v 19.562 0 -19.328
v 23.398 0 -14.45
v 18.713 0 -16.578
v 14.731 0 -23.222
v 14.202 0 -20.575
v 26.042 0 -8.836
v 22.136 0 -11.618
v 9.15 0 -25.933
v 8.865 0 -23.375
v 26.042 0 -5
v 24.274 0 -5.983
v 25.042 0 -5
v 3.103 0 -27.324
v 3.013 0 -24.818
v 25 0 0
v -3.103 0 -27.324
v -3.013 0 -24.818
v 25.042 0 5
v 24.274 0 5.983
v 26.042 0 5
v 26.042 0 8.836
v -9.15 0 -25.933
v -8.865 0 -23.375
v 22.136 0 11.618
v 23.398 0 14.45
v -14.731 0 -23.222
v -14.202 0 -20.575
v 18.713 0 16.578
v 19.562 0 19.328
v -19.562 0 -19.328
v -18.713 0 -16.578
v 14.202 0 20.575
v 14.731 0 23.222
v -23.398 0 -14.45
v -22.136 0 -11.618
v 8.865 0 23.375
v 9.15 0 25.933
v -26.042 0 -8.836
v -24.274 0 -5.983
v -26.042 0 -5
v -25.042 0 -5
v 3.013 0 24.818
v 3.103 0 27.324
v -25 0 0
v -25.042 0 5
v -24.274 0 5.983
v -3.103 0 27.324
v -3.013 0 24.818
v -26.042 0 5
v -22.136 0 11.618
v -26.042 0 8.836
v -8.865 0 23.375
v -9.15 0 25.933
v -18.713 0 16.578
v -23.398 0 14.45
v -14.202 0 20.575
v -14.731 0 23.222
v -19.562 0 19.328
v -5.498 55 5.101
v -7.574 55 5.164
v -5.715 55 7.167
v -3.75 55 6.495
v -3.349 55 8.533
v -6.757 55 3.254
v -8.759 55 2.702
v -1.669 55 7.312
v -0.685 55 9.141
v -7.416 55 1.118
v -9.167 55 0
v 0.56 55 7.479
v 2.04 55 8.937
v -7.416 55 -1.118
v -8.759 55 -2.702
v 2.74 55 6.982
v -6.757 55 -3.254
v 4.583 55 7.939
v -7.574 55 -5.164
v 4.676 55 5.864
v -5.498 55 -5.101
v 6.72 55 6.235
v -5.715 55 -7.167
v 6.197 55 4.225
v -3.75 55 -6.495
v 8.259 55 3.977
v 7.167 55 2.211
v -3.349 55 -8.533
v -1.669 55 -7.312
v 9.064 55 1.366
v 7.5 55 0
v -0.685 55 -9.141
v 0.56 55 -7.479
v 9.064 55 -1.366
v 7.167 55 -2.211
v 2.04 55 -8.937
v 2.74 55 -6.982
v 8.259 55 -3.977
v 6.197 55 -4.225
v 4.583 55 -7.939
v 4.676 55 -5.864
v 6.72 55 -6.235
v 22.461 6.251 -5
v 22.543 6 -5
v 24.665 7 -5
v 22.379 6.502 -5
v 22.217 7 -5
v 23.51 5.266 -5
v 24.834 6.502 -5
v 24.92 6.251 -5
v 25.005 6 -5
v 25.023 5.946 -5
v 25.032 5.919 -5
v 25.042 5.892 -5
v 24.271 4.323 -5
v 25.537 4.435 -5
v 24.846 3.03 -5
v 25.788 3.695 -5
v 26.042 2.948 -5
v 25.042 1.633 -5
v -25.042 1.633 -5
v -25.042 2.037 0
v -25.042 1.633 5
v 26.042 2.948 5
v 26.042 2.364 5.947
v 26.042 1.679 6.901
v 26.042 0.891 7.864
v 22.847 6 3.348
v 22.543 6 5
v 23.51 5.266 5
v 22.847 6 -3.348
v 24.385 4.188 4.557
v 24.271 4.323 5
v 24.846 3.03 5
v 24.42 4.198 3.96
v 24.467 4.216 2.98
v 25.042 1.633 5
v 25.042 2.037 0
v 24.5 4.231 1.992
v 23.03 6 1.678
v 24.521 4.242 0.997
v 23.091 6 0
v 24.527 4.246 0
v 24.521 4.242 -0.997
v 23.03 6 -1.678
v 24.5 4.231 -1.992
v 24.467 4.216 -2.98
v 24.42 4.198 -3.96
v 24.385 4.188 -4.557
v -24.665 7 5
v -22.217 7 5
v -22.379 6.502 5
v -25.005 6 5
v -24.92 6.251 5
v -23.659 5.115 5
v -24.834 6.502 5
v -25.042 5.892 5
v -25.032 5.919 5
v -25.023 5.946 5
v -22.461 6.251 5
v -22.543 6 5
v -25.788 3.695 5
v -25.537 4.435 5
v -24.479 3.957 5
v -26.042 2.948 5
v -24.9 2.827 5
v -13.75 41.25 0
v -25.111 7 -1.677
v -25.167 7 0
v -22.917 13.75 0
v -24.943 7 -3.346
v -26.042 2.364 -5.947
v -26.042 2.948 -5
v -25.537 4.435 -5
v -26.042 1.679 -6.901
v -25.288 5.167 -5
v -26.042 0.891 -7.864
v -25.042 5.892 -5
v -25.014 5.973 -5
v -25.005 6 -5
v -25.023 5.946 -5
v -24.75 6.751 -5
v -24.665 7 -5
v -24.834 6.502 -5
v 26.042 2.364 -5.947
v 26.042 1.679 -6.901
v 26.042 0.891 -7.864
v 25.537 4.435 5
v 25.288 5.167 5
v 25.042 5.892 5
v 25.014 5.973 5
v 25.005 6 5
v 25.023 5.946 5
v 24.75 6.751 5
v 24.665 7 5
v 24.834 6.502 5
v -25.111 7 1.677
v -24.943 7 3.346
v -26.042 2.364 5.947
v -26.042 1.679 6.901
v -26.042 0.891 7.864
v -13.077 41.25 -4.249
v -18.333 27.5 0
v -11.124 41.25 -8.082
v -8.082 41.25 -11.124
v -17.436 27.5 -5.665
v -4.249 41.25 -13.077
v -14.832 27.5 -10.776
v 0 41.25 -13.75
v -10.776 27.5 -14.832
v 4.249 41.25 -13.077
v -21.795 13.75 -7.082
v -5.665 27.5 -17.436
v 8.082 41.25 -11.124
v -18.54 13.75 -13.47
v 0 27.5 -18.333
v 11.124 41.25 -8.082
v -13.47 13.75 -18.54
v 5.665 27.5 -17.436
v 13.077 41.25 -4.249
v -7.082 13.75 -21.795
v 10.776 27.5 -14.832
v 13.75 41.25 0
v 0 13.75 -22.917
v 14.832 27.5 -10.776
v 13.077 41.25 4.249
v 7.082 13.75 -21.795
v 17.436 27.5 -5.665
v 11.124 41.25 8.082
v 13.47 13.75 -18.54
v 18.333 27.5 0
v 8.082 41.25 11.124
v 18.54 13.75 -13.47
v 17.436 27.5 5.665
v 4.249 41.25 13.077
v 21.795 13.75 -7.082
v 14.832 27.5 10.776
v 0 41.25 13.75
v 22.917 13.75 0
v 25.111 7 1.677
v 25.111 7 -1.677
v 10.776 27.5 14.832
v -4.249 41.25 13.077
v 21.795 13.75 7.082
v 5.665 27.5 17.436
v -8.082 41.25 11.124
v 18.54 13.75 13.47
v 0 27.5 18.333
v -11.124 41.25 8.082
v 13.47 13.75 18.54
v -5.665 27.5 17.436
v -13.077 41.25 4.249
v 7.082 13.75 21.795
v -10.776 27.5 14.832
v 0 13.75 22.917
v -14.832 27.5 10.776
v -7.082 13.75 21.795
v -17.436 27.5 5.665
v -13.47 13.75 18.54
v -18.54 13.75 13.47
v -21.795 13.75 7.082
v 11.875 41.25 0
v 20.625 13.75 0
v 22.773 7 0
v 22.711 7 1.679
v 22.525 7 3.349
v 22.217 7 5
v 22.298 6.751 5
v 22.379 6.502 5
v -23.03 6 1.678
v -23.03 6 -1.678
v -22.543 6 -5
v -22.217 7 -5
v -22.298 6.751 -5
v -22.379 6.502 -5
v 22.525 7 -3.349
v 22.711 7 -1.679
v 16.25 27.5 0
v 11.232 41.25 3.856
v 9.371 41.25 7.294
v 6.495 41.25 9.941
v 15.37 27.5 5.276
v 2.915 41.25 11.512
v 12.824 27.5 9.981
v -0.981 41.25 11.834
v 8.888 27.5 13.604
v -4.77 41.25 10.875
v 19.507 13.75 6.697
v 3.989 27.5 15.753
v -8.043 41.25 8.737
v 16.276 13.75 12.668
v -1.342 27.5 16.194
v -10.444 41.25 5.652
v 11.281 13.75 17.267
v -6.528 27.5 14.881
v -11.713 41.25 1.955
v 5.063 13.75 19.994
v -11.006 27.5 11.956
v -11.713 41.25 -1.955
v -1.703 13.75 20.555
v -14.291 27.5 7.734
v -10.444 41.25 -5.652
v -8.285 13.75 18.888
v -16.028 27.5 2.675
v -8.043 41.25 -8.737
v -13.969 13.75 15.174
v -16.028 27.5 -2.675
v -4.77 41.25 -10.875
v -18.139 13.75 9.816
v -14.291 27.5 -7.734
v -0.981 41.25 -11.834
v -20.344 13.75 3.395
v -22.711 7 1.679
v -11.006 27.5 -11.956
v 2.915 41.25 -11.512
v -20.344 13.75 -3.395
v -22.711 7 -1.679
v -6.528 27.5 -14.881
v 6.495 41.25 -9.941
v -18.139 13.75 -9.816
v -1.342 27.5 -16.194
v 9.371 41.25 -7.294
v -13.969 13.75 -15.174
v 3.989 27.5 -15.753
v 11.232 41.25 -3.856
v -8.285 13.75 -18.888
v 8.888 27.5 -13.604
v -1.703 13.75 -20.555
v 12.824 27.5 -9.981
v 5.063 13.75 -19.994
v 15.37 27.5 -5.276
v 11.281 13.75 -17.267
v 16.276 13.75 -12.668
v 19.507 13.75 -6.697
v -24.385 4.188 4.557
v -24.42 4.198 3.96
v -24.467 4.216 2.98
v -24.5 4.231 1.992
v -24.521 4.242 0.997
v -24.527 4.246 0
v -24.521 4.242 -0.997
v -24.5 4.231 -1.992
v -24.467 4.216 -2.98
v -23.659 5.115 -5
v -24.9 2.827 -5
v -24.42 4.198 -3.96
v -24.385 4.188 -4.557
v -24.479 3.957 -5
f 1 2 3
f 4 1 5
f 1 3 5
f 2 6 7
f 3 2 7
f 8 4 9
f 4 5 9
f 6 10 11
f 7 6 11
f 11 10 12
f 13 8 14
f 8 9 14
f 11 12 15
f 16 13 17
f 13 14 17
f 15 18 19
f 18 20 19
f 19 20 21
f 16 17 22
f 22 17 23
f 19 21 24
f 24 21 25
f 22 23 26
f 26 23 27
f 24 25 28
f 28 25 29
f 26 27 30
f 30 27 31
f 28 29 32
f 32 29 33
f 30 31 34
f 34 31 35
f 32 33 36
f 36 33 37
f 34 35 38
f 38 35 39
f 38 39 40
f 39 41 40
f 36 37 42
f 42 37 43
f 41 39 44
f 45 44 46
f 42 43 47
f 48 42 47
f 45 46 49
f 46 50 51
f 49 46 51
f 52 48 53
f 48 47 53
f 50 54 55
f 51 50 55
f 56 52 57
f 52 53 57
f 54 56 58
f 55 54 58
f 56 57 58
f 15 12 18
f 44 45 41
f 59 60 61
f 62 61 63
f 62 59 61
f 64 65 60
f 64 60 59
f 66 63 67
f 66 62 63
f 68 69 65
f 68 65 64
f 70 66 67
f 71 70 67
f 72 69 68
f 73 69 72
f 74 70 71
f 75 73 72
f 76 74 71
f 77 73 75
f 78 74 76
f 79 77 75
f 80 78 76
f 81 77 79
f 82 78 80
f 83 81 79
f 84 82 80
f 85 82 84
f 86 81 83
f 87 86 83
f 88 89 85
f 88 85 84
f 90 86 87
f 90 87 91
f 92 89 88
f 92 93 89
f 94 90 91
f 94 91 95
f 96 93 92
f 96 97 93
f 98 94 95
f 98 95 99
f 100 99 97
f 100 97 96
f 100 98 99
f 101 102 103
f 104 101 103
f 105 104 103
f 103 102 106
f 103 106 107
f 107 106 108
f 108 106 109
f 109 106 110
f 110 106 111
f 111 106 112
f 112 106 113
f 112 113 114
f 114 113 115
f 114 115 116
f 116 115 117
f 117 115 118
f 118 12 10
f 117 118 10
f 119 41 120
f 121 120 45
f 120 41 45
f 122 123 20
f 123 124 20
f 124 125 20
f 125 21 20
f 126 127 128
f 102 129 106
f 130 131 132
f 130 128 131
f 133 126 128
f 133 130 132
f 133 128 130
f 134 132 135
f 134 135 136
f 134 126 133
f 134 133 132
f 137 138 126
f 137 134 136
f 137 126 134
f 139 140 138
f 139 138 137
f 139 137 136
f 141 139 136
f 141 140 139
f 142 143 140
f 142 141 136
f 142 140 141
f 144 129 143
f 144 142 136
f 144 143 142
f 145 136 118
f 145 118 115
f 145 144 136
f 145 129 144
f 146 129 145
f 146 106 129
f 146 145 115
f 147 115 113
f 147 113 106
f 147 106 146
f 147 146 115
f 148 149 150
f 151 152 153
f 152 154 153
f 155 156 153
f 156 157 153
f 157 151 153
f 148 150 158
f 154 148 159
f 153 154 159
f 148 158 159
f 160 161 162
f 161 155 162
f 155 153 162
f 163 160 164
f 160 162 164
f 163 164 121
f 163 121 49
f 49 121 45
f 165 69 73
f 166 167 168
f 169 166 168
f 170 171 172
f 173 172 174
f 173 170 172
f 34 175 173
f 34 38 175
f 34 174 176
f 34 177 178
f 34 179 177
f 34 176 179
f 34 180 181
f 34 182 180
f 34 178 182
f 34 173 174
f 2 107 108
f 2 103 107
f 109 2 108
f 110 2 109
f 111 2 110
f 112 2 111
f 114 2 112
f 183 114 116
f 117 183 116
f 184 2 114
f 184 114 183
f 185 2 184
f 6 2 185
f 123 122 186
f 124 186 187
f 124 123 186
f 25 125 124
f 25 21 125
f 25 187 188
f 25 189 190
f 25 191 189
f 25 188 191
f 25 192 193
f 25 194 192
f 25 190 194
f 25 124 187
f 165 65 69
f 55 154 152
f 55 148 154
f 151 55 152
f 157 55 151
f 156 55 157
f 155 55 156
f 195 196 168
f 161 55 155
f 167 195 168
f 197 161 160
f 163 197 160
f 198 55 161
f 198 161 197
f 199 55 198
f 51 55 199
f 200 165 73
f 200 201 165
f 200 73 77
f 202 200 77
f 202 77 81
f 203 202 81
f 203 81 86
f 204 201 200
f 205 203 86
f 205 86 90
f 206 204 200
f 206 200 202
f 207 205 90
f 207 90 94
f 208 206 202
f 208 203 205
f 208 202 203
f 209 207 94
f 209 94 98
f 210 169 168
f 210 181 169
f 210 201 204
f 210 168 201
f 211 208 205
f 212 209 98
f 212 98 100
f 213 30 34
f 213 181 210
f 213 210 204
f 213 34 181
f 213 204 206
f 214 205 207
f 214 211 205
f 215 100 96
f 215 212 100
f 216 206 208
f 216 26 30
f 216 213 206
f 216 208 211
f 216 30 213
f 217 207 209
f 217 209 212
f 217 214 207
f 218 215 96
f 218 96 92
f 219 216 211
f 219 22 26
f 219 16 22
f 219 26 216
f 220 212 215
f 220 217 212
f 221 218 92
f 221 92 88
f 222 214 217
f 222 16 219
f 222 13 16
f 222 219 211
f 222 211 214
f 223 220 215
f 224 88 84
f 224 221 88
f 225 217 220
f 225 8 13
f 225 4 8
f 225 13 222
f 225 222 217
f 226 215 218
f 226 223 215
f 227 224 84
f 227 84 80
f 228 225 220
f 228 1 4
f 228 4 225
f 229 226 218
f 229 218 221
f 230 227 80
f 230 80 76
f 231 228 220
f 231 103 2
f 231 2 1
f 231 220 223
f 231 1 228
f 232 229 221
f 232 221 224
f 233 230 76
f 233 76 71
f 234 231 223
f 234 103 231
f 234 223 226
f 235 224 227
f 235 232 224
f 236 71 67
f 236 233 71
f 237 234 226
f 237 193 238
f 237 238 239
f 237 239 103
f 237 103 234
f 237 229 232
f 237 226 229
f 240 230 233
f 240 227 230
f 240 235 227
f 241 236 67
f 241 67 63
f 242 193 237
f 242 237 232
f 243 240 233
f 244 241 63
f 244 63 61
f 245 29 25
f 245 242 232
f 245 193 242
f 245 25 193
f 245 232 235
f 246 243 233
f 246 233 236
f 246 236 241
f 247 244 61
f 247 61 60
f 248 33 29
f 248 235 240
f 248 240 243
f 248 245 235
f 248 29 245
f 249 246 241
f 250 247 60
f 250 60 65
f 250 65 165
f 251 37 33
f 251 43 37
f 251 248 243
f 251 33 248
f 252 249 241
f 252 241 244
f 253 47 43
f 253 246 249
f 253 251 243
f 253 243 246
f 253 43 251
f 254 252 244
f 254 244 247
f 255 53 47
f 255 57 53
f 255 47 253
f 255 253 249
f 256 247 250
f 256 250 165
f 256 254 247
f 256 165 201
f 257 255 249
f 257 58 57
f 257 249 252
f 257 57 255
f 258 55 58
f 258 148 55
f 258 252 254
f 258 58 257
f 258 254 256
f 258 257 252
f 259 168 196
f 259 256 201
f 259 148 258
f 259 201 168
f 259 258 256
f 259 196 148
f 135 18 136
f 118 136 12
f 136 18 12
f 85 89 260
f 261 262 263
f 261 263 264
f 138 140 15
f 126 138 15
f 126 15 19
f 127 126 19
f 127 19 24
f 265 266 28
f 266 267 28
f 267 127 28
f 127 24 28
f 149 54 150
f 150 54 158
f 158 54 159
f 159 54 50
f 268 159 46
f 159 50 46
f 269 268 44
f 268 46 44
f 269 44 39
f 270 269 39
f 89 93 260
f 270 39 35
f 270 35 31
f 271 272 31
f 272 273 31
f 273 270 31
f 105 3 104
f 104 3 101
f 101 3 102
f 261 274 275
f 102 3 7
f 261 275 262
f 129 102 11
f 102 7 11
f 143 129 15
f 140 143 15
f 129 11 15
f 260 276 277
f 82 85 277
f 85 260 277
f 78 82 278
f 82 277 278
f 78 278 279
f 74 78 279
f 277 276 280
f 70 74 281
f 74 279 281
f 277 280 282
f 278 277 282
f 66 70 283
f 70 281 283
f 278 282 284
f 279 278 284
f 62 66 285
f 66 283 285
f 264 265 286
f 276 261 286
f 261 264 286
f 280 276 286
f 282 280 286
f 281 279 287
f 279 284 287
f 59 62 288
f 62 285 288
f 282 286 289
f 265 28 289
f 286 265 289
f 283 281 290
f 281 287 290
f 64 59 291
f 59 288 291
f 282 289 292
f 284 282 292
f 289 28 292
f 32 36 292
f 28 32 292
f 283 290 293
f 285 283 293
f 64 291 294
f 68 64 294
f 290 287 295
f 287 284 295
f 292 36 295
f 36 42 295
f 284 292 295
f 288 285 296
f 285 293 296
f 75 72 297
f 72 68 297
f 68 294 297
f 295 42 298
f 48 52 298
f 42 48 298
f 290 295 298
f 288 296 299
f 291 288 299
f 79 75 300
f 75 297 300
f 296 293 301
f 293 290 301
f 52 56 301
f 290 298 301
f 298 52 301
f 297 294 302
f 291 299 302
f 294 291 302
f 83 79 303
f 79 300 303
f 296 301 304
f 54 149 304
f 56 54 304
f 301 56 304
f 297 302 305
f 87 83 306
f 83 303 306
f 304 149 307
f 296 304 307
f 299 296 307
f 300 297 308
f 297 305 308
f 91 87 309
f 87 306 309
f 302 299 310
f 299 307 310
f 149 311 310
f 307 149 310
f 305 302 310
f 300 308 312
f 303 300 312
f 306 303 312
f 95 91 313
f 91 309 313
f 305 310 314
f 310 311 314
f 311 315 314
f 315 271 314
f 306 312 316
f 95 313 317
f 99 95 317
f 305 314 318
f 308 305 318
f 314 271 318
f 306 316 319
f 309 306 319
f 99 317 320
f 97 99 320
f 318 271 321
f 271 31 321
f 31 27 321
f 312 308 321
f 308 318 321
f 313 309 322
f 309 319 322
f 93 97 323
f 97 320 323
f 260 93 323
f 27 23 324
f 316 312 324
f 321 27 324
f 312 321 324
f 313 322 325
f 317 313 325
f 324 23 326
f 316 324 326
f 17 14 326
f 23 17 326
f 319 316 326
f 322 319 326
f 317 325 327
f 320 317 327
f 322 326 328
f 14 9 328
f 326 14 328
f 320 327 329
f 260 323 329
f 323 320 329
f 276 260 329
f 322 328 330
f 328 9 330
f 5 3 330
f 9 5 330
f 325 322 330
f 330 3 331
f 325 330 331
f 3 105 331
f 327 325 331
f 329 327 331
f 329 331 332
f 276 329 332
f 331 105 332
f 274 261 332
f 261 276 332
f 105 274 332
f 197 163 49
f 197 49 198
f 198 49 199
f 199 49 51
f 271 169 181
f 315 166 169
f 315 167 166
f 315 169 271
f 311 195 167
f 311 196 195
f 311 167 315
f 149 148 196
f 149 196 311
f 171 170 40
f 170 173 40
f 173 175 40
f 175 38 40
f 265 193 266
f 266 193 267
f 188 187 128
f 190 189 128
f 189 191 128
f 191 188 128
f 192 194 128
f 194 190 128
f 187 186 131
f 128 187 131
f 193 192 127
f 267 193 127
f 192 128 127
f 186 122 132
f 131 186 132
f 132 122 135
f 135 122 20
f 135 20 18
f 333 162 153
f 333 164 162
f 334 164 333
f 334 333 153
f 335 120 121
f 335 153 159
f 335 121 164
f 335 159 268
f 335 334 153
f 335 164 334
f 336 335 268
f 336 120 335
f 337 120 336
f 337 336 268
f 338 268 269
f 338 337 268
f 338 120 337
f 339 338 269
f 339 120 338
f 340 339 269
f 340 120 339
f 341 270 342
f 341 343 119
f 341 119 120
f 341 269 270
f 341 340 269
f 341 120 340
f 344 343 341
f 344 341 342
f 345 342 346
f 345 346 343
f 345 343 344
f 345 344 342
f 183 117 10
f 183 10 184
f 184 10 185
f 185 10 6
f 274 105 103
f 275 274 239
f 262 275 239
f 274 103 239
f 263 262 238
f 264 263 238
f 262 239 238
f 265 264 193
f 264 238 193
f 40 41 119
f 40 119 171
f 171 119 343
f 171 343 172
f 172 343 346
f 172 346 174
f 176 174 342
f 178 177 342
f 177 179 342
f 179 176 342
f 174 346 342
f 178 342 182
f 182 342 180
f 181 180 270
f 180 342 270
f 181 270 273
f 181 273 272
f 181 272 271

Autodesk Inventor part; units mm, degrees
ref_plane "YZ Plane" through (0, 0, 0) normal (1, 0, 0) x (0, 1, 0)
ref_plane "XZ Plane" through (0, 0, 0) normal (0, 1, 0) x (-1, 0, 0)
ref_plane "XY Plane" through (0, 0, 0) normal (0, 0, 1) x (1, 0, 0)
sketch "Sketch1" plane through (0, 0, 0) normal (0, 1, 0) x (-1, 0, 0)
  point P0 (0, 0)
sketch "Sketch2" plane through (0, 0, 0) normal (0, 1, 0) x (-1, 0, 0)
  circle A0 centre (0, 0) radius 7.5
  dimension "d0" = 15
extrude "Extrusion1" add sketch "Sketch2" along normal blind 60
sketch "Sketch3" plane through (0, 60, 0) normal (0, 1, 0) x (1, 0, 0)
  circle A0 centre (0, 0) radius 7.5
sketch "Sketch4" plane through (0, 0, 0) normal (0, -1, 0) x (1, 0, 0)
  circle A0 centre (0, 0) radius 25
  circle A1 centre (0, 0) radius 7.5 projected
  circle A2 centre (0, 0) radius 27.5
  dimension "d3" = 50
  dimension "d4" = 55
loft "Loft1" add profiles "Sketch4" section 1 edges at (7.5, 60, 0) contours A0 | A1 | A2
sketch "Sketch5" plane through (0, 0, 0) normal (0, -1, 0) x (1, 0, 0)
  circle A0 centre (0, 0) radius 7.5 projected
  circle A1 centre (0, 0) radius 27.5
  circle A2 centre (0, 0) radius 25
  circle A3 centre (0, 0) radius 7.5
  dimension "d9" = 50
  dimension "d10" = 15
sketch "Sketch6" plane through (0, 60, 0) normal (0, 1, 0) x (1, 0, 0)
  circle A0 centre (0, 0) radius 7.5
extrude "Extrusion2" cut sketch "Sketch6" against normal blind 5
sketch "Sketch7" plane through (0, 55, 0) normal (0, 1, 0) x (1, 0, 0)
  circle A0 centre (0, 0) radius 7.5
  line L0 (-11.197, -10.4421) -> (10.2744, -10.4421)
  line L1 (10.2744, -10.4421) -> (10.2744, 11.5325)
  line L2 (10.2744, 11.5325) -> (-11.197, 11.5325)
  line L3 (-11.197, 11.5325) -> (-11.197, -10.4421)
loft "Loft2" cut profiles "Sketch5" section 1 edges at (-7.5, 55, 0) contours A0 | A2
extrude "Extrusion3" cut sketch "Sketch7" along normal through all
sketch "Sketch8" plane through (0, 0, 0) normal (0, -1, 0) x (1, 0, 0)
  circle A0 centre (0, 0) radius 25
  circle A1 centre (0, 0) radius 27.5
  line L0 (27.5, 0) -> (27.5, -5)
  line L1 (27.0416, -5) -> (26.0416, -5)
  line L2 (26.0416, -5) -> (26.0416, 5)
  line L3 (26.0416, 5) -> (27.0416, 5)
  line L4 (27.0416, 5) -> (27.0416, -5)
  line L5 (-27.5, 0) -> (-27.5, -5)
  line L6 (-27.0416, -5) -> (-26.0416, -5)
  line L7 (-26.0416, -5) -> (-26.0416, 5)
  line L8 (-26.0416, 5) -> (-27.0416, 5)
  line L9 (-27.0416, 5) -> (-27.0416, -5)
  line L10 (26.0416, -5) -> (25.0416, -5)
  line L11 (25.0416, -5) -> (25.0416, 5)
  line L12 (25.0416, 5) -> (26.0416, 5)
  line L13 (26.0416, 5) -> (26.0416, -5)
  line L14 (-26.0416, -5) -> (-25.0416, -5)
  line L15 (-25.0416, -5) -> (-25.0416, 5)
  line L16 (-25.0416, 5) -> (-26.0416, 5)
  line L17 (-26.0416, 5) -> (-26.0416, -5)
  line L18 (-26.0416, 5) -> (-26.0416, 8.8365)
  line L19 (-26.0416, -5) -> (-26.0416, -8.8365)
  line L20 (26.0416, -5) -> (26.0416, -8.8365)
  line L21 (26.0416, 5) -> (26.0416, 8.8365)
  circle A2 centre (0, 0) radius 27.5 projected
  dimension "d19" = 5
  dimension "d20" = 1
  dimension "d21" = 10
  dimension "d22" = 5
  dimension "d23" = 1
  dimension "d24" = 10
  dimension "d25" = 1
  dimension "d26" = 1
extrude "Extrusion4" cut sketch "Sketch8" against normal through all contours A1 L4 | L3 L21 A1 | L4 L1 L2 L3 | A1 L20 L1 | L18 L8 A1 | A1 L6 L19 | L9 A1 | L8 L7 L6 L9
sketch "Sketch9" plane through (0, 0, 0) normal (0, -1, 0) x (1, 0, 0)
  circle A0 centre (0, 0) radius 27.5
  circle A1 centre (0, 0) radius 25
  line L0 (27.5, 0) -> (27.5, -5)
  line L1 (26.0416, -8.8365) -> (26.0416, 8.8365) projected
  line L2 (27.0416, -5) -> (26.0416, -5)
  line L3 (26.0416, -5) -> (26.0416, 5)
  line L4 (26.0416, 5) -> (27.0416, 5)
  line L5 (27.0416, 5) -> (27.0416, -5)
  line L6 (26.0416, 5) -> (25.0416, 5)
  line L7 (25.0416, 5) -> (25.0416, -5)
  line L8 (25.0416, -5) -> (26.0416, -5)
  line L9 (26.0416, -5) -> (26.0416, 5)
  line L10 (-27.5, 0) -> (-27.5, -5)
  line L11 (-26.0416, 8.8365) -> (-26.0416, -8.8365) projected
  line L12 (-27.0416, -5) -> (-26.0416, -5)
  line L13 (-26.0416, -5) -> (-26.0416, 5)
  line L14 (-26.0416, 5) -> (-27.0416, 5)
  line L15 (-27.0416, 5) -> (-27.0416, -5)
  line L16 (-26.0416, -5) -> (-25.0416, -5)
  line L17 (-25.0416, -5) -> (-25.0416, 5)
  line L18 (-25.0416, 5) -> (-26.0416, 5)
  line L19 (-26.0416, 5) -> (-26.0416, -5)
  dimension "d29" = 5
  dimension "d30" = 10
  dimension "d31" = 1
  dimension "d32" = 5
  dimension "d33" = 10
  dimension "d34" = 1
extrude "Extrusion5" cut sketch "Sketch9" against normal blind 7 contours L1 L8 L7 L6 | L18 L17 L16 L11
sketch "Sketch10" plane through (25.0416, 0, 5) normal (1, 0, 0) x (0, 0, -1)
  line L0 (0, 0) -> (10, 0)
  line L1 (10, 0) -> (10, 7)
  line L2 (10, 7) -> (0, 7)
  line L3 (0, 7) -> (0, 0)
  line L4 (10, 7) -> (0, 7)
  line L5 (0, 7) -> (0, 6)
  line L6 (0, 6) -> (10, 6)
  line L7 (10, 6) -> (10, 7)
  point P0 (5, 0)
  dimension "d37" = 10
  dimension "d38" = 7
  dimension "d39" = 1
extrude "Extrusion6" cut sketch "Sketch10" against normal through all contours L3 L2 L1 L6
fillet "Fillet1" radius 5 1 edges at (25.0416, 6, 0)
fillet "Fillet2" radius 5 1 edges at (-25.0416, 6, 0)
properties part number "cone_p2_testpart1"
